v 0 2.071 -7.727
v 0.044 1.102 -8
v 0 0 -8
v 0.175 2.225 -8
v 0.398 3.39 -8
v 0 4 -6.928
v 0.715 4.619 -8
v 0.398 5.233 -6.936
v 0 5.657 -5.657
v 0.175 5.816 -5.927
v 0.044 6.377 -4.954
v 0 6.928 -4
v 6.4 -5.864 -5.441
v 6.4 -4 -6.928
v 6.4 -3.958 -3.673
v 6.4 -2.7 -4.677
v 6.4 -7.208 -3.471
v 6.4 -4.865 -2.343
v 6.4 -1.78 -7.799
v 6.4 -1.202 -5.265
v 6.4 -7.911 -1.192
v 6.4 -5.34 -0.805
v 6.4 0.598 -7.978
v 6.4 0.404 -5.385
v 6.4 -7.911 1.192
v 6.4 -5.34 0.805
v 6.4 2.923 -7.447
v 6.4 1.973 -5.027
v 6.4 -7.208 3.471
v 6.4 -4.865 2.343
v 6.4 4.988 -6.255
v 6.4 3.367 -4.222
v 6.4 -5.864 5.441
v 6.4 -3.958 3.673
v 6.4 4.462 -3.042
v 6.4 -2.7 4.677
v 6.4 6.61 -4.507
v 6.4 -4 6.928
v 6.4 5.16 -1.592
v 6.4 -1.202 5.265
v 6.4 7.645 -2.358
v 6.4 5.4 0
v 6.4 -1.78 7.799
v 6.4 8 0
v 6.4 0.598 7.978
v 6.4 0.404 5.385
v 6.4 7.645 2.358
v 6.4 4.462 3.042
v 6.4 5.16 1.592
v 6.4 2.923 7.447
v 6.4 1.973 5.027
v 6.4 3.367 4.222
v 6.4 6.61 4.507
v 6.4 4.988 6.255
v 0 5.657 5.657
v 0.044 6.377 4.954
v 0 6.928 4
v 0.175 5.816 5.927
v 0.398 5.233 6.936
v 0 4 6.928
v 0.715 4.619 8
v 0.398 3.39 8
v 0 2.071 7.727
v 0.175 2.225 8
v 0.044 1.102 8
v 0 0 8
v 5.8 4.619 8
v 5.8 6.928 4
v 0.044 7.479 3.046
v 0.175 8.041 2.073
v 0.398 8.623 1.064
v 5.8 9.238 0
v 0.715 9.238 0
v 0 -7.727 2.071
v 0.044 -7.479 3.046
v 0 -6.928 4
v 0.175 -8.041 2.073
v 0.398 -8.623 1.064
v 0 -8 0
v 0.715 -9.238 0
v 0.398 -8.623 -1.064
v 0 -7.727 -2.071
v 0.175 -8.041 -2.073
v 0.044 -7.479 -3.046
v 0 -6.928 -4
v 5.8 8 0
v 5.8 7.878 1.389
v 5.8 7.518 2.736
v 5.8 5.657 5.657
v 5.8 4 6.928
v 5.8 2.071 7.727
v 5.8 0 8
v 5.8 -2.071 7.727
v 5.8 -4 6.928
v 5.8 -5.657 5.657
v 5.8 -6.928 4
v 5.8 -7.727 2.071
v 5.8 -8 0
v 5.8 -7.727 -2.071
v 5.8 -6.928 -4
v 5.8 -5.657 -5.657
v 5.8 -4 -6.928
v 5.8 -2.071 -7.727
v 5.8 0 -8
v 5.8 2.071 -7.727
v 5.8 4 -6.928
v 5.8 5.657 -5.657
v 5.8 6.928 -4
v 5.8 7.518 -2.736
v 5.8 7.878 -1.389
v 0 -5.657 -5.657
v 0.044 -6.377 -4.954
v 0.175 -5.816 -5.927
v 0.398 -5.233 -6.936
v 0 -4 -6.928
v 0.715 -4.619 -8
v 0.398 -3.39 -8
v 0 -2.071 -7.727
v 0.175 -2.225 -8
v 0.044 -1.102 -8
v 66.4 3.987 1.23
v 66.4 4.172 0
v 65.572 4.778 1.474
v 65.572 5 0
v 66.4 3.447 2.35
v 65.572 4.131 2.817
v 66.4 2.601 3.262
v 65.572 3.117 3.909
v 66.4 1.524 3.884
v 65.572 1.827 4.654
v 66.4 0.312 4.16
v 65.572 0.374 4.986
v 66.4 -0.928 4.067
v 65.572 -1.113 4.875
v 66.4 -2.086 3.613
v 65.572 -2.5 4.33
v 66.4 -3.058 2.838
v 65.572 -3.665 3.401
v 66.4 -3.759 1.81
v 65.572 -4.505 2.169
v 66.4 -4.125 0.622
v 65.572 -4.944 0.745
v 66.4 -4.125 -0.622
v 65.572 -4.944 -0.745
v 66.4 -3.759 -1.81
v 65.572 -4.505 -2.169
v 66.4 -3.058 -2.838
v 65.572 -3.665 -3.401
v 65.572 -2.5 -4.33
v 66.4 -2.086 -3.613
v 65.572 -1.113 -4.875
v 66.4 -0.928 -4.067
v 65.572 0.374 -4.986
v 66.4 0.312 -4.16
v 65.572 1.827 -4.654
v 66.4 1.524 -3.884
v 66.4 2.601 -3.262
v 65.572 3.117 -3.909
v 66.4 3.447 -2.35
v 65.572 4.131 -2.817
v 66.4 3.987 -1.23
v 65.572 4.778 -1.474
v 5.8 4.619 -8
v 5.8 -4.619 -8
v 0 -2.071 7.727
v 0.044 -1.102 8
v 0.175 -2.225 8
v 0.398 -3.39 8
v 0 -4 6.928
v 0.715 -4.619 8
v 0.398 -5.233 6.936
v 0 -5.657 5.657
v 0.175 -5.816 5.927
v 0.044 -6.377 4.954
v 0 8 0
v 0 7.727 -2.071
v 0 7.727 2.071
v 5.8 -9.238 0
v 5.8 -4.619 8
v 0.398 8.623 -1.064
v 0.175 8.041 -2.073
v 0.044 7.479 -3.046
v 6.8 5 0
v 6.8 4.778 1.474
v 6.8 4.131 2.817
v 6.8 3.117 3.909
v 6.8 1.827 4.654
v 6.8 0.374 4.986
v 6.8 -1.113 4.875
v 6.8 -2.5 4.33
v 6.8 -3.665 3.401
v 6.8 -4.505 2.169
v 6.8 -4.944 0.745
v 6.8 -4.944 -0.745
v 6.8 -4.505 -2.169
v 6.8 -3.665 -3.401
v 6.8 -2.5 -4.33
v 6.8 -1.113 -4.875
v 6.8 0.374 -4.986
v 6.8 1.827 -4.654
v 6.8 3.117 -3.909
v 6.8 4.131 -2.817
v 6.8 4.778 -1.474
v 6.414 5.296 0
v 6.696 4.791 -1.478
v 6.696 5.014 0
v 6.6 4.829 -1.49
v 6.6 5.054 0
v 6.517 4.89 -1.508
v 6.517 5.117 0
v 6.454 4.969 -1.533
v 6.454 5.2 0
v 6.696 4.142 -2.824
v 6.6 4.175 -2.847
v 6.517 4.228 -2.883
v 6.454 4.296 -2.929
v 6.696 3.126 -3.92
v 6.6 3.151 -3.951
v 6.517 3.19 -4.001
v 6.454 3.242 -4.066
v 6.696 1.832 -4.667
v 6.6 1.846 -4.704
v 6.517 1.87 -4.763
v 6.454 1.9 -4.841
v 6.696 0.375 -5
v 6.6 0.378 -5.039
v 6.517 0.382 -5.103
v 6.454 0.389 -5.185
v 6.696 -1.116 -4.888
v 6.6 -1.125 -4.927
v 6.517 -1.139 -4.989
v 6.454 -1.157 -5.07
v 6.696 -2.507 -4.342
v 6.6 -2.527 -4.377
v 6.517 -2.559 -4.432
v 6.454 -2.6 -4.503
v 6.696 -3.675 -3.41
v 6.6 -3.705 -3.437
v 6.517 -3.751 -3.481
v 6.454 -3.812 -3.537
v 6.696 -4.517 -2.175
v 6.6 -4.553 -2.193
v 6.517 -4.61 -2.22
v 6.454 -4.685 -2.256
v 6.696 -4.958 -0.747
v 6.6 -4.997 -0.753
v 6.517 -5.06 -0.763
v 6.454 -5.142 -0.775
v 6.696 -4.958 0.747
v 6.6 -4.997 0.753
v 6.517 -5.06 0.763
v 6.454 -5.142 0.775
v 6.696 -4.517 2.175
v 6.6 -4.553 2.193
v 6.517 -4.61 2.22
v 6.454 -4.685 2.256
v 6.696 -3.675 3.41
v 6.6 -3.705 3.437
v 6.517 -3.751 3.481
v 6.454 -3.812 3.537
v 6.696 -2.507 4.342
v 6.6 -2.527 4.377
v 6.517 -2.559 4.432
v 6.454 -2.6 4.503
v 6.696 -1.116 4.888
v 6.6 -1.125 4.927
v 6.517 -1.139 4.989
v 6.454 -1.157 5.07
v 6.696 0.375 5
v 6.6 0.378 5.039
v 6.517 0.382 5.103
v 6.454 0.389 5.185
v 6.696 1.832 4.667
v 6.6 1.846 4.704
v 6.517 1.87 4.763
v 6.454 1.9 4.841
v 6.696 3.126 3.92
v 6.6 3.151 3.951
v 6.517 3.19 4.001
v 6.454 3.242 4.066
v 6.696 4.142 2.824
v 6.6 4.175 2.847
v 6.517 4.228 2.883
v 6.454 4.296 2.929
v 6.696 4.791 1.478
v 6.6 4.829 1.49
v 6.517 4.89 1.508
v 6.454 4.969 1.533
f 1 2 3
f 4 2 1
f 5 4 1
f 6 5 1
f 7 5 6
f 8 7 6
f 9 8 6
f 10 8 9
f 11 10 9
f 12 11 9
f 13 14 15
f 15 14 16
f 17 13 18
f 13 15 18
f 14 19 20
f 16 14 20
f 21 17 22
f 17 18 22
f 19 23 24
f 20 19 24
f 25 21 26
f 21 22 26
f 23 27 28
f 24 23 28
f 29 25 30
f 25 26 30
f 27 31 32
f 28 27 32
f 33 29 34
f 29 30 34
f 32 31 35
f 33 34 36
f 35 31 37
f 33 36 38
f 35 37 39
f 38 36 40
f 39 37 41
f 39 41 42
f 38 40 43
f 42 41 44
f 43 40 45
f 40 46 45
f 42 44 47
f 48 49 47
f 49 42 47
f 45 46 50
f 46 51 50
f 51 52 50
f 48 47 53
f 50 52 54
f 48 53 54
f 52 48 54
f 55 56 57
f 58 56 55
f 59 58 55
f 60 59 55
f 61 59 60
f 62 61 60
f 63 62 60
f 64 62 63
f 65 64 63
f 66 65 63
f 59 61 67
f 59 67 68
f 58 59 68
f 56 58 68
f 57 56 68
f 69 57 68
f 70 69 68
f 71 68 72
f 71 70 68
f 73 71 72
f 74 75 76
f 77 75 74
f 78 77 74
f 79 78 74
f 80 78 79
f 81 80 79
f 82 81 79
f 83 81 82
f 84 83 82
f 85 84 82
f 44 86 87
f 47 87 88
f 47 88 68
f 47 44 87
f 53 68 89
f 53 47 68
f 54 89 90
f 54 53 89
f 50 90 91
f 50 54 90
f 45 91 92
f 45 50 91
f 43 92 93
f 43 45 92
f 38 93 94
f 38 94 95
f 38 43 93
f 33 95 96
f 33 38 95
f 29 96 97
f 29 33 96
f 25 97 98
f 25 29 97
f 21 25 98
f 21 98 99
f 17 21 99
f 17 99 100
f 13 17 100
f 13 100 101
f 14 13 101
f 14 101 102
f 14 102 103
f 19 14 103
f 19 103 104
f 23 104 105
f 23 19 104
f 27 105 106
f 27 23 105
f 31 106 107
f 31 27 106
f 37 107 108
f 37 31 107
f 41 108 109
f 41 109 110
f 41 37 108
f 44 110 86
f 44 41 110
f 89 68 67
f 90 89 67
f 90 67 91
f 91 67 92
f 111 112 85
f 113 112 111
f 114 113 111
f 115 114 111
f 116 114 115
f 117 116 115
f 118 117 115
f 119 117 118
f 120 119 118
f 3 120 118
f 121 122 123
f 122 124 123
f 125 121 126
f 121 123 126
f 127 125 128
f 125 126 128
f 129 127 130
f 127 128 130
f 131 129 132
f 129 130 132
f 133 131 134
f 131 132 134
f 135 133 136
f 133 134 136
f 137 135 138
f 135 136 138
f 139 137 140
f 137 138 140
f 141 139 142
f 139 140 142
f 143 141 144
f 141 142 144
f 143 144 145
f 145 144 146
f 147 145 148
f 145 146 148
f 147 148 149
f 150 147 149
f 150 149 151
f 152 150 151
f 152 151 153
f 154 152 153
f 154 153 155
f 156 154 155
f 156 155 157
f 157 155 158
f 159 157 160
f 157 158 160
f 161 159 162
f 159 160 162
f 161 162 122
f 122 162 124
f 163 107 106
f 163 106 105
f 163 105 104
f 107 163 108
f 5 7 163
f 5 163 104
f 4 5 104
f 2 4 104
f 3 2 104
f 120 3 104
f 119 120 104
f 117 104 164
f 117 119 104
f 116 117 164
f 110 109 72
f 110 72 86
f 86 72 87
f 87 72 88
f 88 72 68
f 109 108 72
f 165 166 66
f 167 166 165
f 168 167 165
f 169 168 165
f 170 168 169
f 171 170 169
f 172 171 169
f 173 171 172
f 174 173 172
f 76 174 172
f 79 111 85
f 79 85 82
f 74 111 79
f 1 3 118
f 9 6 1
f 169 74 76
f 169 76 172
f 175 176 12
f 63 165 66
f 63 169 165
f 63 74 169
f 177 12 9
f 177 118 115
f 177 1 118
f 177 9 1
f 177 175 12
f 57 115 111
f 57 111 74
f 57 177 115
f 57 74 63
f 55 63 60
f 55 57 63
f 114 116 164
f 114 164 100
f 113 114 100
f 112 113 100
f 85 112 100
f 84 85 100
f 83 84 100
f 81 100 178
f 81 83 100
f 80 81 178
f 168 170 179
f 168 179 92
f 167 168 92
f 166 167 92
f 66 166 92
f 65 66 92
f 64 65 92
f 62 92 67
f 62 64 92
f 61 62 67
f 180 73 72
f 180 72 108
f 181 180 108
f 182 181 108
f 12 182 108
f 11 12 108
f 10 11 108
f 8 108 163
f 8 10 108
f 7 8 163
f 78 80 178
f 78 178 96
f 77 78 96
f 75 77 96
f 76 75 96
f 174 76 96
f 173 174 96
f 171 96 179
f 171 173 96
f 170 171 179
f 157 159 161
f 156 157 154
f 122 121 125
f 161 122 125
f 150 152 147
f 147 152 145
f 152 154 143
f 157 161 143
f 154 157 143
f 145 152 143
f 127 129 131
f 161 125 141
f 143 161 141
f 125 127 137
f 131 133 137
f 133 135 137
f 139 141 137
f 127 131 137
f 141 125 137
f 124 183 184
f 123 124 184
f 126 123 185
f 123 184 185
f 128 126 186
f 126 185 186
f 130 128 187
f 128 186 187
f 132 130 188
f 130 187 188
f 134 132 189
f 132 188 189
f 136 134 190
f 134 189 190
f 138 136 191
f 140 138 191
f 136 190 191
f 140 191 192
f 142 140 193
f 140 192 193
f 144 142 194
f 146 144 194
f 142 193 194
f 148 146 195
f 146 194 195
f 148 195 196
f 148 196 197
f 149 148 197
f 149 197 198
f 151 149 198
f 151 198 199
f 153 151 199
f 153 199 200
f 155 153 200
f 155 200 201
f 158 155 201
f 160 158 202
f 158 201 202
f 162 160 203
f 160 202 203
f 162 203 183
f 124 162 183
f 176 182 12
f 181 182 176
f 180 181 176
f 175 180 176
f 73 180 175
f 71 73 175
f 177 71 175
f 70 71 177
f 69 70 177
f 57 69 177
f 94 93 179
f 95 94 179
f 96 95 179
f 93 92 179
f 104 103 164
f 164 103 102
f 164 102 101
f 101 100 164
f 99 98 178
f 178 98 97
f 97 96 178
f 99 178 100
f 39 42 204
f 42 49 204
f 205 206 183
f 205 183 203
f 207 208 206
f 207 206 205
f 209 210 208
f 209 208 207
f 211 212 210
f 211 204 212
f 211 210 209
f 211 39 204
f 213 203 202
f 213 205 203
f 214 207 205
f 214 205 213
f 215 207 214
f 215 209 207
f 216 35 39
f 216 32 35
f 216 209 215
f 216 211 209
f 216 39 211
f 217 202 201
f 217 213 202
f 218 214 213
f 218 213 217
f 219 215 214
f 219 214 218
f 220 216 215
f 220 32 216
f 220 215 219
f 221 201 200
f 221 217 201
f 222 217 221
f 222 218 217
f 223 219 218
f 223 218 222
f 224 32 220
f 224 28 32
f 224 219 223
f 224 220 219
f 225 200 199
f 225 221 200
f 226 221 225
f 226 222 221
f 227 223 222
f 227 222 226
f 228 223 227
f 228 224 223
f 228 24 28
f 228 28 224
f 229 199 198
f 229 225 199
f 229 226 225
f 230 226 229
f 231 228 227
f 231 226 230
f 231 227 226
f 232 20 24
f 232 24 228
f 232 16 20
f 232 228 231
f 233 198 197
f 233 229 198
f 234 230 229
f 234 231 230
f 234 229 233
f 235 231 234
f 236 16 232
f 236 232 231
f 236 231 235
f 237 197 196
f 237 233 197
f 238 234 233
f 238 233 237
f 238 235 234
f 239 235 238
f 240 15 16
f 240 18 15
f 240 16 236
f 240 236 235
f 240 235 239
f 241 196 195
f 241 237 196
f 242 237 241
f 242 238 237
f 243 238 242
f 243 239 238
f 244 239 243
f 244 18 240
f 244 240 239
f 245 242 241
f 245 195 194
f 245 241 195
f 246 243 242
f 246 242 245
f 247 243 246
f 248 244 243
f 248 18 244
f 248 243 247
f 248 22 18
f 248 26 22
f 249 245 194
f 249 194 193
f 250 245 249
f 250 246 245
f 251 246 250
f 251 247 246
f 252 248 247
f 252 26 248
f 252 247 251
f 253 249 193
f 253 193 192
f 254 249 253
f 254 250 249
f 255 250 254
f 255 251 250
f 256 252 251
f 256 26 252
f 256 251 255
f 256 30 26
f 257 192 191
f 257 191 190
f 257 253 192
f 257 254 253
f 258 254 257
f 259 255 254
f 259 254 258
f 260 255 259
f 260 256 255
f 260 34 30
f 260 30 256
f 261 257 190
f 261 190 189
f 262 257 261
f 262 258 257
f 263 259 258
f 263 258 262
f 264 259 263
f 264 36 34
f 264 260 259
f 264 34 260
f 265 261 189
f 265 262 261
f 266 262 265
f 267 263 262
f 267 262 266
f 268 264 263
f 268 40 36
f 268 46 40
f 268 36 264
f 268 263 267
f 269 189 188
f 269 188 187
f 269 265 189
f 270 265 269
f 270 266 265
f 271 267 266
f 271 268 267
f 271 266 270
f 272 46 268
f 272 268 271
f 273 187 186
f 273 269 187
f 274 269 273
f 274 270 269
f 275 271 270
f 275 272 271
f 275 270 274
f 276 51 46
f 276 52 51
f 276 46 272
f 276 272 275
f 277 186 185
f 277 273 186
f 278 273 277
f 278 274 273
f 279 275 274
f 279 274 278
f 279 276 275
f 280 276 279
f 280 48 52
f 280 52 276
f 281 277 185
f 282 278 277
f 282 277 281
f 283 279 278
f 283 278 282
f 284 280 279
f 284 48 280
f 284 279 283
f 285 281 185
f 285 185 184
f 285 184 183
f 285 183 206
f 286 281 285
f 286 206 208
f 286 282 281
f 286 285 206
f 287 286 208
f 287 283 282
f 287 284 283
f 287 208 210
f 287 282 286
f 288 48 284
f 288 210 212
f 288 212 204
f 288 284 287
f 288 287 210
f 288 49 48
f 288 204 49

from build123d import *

# Parameters (mm, degrees)
BASEHEAD_DEPTH = 6.4
HEADFILLET_R   = 0.4
SKETCH4_W      = 0.6
SKETCH4_H      = 11.237604307


with BuildPart() as part:
    # Sketch1 → BaseHead (new body)
    with BuildSketch(Plane(origin=(0, 0, 0), x_dir=(0, 0, -1), z_dir=(1, 0, 0))):
        Polygon((8, 4.618802154), (8, -4.618802154), (0, -9.237604307), (-8, -4.618802154), (-8, 4.618802154), (0, 9.237604307), align=None)
    extrude(amount=BASEHEAD_DEPTH)

    # BodySke → BaseBody (revolve)
    with BuildSketch(Plane.XY):
        Polygon((0, 0), (66.4, 0), (66.4, 4.172), (65.572, 5), (0, 5), align=None)
    revolve(axis=Axis((0, 0, 0), (1, 0, 0)))

    # HeadFillet
    headfillet_edges = [part.edges().sort_by_distance(p)[0] for p in [
        (6.4, -5, 0),
    ]]
    fillet(headfillet_edges, radius=HEADFILLET_R)

    # Sketch3 → HeadChamfer (revolve, cut)
    with BuildSketch(Plane.XY):
        Polygon((0, 8), (3.601282526, 14.237604307), (3.601282526, 19.237604307), (-10, 19.237604307), (-10, 8), align=None)
    revolve(axis=Axis((0, 0, 0), (1, 0, 0)), mode=Mode.SUBTRACT)

    # Sketch4 → BearingFace (revolve, cut)
    with BuildSketch(Plane.XY):
        with Locations((6.1, 13.618802154)):
            Rectangle(SKETCH4_W, SKETCH4_H)
    revolve(axis=Axis((0, 0, 0), (1, 0, 0)), mode=Mode.SUBTRACT)


solid = part.part
